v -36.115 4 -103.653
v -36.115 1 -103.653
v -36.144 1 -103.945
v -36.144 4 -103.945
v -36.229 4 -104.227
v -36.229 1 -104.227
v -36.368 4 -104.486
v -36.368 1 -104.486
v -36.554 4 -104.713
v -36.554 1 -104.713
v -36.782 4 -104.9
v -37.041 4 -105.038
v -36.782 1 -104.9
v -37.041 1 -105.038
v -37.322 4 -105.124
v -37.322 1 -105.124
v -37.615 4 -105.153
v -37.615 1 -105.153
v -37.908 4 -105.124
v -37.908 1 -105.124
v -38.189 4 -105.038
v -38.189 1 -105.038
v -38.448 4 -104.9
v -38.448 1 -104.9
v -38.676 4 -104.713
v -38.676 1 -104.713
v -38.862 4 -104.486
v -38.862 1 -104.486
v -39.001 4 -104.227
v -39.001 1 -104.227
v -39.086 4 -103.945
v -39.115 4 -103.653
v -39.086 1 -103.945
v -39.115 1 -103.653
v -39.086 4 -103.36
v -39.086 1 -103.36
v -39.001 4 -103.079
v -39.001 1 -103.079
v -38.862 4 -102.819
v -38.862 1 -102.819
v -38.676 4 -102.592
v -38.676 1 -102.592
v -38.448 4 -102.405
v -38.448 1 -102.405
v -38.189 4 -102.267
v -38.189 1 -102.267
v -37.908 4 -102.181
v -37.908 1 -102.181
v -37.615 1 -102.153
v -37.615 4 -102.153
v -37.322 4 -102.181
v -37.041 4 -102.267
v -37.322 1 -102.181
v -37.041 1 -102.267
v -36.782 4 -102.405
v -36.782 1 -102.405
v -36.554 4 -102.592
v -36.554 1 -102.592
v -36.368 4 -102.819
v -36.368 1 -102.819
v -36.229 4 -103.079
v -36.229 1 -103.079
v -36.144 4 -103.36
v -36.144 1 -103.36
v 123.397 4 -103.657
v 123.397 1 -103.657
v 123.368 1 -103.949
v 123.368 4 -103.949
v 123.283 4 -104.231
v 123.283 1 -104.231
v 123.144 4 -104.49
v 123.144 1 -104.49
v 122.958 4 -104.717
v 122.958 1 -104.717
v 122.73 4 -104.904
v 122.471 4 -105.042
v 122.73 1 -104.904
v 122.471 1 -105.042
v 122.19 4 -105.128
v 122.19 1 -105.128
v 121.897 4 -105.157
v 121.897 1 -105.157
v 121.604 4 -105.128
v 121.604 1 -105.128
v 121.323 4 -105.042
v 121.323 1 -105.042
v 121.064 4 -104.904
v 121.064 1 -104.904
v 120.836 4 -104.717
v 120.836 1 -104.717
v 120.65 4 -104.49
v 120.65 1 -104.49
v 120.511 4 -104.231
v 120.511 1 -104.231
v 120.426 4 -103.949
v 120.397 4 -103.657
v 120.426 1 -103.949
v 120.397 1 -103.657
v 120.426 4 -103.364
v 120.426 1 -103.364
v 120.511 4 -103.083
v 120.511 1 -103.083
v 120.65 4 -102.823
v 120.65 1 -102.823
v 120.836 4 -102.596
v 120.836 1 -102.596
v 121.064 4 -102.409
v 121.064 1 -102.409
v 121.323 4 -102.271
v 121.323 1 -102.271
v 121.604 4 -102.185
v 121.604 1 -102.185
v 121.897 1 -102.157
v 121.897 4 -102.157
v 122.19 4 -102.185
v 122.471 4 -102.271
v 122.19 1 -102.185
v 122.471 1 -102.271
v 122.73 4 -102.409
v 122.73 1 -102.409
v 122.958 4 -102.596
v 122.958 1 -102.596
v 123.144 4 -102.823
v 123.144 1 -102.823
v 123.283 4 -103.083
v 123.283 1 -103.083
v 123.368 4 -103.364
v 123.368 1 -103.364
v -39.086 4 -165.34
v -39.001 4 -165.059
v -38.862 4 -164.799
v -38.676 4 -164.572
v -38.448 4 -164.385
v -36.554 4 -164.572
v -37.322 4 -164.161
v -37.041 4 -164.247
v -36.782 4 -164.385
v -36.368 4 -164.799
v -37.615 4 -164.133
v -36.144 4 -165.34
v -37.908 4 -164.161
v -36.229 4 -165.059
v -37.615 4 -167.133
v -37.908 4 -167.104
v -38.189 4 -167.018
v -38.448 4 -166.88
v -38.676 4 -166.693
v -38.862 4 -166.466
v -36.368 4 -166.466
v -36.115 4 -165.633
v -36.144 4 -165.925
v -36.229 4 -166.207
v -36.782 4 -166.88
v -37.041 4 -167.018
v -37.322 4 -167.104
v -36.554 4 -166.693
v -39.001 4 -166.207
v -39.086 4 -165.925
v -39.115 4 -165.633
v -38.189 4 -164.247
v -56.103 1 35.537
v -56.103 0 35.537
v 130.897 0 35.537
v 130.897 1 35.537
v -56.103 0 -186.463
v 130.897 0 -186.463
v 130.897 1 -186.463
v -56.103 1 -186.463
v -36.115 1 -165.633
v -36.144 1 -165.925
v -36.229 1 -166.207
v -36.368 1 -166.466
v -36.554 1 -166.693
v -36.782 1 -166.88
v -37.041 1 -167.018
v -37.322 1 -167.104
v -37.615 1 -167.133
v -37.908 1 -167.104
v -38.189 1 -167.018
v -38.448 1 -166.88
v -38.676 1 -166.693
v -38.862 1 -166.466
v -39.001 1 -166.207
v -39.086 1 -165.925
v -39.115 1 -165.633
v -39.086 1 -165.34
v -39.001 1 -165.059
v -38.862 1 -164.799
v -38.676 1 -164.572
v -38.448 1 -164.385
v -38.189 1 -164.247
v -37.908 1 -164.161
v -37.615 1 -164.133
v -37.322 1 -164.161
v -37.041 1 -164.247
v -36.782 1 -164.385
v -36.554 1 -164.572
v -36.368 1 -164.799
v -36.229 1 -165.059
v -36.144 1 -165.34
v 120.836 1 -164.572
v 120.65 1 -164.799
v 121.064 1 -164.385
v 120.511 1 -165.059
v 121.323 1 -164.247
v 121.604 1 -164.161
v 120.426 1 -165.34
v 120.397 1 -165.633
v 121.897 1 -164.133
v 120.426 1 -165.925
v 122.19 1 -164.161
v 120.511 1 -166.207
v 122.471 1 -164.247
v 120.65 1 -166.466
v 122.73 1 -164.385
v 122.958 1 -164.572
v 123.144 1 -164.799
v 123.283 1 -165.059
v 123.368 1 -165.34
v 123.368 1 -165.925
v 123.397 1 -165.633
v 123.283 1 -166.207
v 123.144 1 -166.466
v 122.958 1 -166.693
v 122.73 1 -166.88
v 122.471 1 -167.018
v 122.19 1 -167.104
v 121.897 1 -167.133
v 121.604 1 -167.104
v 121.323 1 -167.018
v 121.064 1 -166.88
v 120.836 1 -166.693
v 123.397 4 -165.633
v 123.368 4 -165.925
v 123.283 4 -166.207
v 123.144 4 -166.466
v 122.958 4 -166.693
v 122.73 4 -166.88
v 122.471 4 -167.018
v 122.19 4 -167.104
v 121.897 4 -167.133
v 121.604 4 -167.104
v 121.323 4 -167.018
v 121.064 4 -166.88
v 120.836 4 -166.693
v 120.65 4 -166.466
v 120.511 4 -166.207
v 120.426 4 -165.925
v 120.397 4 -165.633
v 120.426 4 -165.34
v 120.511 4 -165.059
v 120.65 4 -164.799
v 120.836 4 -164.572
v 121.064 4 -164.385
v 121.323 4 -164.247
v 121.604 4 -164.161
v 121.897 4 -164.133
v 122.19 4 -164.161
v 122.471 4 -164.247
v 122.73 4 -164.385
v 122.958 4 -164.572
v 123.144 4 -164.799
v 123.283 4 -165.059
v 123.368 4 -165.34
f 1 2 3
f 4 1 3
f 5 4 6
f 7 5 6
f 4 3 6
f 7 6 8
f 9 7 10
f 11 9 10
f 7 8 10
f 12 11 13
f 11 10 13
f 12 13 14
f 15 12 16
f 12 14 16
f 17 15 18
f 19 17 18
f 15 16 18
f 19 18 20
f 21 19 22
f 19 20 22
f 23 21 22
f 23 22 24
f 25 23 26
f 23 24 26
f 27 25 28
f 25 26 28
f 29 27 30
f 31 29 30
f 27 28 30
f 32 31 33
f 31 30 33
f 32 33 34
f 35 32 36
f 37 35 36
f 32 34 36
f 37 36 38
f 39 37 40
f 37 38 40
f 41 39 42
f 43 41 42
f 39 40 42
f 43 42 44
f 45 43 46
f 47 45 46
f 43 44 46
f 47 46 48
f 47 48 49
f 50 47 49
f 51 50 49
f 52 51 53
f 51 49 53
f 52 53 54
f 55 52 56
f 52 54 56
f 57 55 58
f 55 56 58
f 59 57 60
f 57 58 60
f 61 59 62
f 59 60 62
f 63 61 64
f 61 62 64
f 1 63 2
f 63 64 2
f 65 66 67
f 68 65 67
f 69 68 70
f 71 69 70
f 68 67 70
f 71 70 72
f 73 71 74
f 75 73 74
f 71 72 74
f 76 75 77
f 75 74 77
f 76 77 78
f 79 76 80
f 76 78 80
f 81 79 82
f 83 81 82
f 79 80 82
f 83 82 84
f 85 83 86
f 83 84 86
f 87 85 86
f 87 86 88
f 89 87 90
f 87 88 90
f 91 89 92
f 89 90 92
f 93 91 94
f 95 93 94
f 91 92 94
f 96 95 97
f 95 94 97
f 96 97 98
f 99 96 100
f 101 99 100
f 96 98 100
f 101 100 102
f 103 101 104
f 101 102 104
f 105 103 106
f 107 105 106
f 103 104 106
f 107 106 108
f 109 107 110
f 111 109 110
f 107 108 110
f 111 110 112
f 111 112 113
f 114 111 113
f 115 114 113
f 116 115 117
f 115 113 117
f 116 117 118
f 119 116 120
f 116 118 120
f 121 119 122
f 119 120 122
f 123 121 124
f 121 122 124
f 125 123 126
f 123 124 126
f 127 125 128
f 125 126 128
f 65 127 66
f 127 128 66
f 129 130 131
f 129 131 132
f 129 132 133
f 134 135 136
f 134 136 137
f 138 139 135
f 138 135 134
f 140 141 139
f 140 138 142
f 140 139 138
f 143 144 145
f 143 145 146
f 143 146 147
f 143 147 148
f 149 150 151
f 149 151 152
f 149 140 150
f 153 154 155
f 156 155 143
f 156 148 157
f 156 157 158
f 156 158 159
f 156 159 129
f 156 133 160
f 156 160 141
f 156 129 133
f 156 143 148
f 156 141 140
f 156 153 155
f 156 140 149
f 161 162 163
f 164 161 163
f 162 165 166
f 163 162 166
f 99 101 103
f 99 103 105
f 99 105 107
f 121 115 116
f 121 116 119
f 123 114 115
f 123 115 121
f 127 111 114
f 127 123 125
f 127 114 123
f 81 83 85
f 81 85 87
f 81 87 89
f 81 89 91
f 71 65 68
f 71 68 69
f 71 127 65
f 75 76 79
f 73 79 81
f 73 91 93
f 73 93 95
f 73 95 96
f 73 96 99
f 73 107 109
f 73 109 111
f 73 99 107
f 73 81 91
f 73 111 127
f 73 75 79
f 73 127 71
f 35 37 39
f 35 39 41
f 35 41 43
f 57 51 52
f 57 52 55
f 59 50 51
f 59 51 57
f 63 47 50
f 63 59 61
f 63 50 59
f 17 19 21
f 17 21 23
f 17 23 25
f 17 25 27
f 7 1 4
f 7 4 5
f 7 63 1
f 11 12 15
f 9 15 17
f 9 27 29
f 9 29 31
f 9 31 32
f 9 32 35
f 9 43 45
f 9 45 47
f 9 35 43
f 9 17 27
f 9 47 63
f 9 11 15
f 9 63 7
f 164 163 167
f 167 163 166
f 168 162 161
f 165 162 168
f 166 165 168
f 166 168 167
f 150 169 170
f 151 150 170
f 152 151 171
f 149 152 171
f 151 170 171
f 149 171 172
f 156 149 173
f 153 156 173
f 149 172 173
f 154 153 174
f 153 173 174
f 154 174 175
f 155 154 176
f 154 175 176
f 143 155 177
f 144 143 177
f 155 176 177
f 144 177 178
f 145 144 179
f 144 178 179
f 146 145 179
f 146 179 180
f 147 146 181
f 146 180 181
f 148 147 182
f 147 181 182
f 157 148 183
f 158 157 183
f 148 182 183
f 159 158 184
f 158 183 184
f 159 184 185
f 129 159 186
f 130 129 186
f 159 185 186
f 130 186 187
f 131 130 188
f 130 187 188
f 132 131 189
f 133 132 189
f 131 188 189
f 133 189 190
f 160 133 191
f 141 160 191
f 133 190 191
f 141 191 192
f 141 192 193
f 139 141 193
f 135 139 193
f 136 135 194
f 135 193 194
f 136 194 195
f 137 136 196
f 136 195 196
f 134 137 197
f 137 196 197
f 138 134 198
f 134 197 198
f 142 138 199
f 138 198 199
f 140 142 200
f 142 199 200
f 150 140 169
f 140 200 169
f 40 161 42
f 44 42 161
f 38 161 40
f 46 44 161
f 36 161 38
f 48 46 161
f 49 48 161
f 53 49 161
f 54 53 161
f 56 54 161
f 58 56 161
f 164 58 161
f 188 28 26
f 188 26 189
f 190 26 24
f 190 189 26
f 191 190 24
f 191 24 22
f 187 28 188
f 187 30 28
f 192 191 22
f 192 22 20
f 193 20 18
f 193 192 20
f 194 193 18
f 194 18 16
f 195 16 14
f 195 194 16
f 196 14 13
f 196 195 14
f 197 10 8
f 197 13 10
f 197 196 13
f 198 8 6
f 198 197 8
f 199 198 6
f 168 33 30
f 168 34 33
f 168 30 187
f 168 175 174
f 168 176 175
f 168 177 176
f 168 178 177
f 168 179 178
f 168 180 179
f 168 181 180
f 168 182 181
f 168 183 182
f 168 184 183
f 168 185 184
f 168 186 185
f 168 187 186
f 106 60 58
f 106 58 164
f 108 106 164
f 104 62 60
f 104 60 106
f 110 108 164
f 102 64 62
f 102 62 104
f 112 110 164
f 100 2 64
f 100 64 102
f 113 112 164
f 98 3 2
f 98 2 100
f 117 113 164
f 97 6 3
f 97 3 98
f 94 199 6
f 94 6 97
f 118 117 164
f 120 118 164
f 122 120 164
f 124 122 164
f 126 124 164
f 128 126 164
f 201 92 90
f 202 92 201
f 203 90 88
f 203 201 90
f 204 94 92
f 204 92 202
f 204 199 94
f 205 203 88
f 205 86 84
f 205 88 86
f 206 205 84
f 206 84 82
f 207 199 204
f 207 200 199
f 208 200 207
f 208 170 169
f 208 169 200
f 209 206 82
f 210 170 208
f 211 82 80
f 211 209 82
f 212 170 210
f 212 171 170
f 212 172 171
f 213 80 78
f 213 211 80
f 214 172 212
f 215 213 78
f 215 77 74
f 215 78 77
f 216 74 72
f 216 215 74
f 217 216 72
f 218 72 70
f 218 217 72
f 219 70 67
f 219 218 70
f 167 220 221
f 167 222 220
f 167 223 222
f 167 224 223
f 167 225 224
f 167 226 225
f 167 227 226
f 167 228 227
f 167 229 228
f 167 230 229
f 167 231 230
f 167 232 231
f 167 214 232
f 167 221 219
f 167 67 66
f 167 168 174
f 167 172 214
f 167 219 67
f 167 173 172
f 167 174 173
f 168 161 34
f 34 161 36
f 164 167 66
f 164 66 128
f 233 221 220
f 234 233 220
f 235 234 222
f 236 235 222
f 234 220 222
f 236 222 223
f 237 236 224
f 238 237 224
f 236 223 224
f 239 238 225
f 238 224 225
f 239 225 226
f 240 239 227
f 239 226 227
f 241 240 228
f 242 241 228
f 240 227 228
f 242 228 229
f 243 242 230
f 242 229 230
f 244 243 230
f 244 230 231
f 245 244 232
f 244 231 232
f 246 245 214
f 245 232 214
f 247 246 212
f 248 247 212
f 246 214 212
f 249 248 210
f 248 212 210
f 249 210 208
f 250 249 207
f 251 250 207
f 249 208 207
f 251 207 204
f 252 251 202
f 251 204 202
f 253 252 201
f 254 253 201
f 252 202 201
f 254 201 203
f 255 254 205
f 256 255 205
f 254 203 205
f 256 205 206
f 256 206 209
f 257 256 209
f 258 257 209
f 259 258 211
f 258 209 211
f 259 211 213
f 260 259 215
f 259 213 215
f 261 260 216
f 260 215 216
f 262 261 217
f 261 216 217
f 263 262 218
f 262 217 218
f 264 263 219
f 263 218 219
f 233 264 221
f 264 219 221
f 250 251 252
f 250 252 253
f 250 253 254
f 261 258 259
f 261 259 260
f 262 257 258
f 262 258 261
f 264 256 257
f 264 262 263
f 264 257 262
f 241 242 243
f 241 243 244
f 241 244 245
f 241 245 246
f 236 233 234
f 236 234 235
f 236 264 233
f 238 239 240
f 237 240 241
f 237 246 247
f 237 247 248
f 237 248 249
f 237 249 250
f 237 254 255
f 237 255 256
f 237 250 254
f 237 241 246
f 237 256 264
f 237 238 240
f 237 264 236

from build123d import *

# Parameters (mm, degrees)
SKETCH1_W           = 187
SKETCH1_H           = 222
BOSS_EXTRUDE1_DEPTH = 1
SKETCH2_R           = 1.5
BOSS_EXTRUDE2_DEPTH = 3


with BuildPart() as part:
    # Sketch1 → Boss-Extrude1 (new body)
    with BuildSketch(Plane(origin=(0, 0, 0), x_dir=(1, 0, 0), z_dir=(0, 1, 0))):
        with Locations((37.397058758, 75.462578399)):
            Rectangle(SKETCH1_W, SKETCH1_H)
    extrude(amount=BOSS_EXTRUDE1_DEPTH)

    # Sketch2 → Boss-Extrude2 (add)
    with BuildSketch(Plane(origin=(0, 1, 0), x_dir=(1, 0, 0), z_dir=(0, 1, 0))):
        with Locations((121.897058758, 165.632578399)):
            Circle(SKETCH2_R)
        with Locations((-37.614941242, 165.632578399)):
            Circle(SKETCH2_R)
        with Locations((121.897058758, 103.656578399)):
            Circle(SKETCH2_R)
        with Locations((-37.614941242, 103.652578399)):
            Circle(SKETCH2_R)
    extrude(amount=BOSS_EXTRUDE2_DEPTH)


solid = part.part
